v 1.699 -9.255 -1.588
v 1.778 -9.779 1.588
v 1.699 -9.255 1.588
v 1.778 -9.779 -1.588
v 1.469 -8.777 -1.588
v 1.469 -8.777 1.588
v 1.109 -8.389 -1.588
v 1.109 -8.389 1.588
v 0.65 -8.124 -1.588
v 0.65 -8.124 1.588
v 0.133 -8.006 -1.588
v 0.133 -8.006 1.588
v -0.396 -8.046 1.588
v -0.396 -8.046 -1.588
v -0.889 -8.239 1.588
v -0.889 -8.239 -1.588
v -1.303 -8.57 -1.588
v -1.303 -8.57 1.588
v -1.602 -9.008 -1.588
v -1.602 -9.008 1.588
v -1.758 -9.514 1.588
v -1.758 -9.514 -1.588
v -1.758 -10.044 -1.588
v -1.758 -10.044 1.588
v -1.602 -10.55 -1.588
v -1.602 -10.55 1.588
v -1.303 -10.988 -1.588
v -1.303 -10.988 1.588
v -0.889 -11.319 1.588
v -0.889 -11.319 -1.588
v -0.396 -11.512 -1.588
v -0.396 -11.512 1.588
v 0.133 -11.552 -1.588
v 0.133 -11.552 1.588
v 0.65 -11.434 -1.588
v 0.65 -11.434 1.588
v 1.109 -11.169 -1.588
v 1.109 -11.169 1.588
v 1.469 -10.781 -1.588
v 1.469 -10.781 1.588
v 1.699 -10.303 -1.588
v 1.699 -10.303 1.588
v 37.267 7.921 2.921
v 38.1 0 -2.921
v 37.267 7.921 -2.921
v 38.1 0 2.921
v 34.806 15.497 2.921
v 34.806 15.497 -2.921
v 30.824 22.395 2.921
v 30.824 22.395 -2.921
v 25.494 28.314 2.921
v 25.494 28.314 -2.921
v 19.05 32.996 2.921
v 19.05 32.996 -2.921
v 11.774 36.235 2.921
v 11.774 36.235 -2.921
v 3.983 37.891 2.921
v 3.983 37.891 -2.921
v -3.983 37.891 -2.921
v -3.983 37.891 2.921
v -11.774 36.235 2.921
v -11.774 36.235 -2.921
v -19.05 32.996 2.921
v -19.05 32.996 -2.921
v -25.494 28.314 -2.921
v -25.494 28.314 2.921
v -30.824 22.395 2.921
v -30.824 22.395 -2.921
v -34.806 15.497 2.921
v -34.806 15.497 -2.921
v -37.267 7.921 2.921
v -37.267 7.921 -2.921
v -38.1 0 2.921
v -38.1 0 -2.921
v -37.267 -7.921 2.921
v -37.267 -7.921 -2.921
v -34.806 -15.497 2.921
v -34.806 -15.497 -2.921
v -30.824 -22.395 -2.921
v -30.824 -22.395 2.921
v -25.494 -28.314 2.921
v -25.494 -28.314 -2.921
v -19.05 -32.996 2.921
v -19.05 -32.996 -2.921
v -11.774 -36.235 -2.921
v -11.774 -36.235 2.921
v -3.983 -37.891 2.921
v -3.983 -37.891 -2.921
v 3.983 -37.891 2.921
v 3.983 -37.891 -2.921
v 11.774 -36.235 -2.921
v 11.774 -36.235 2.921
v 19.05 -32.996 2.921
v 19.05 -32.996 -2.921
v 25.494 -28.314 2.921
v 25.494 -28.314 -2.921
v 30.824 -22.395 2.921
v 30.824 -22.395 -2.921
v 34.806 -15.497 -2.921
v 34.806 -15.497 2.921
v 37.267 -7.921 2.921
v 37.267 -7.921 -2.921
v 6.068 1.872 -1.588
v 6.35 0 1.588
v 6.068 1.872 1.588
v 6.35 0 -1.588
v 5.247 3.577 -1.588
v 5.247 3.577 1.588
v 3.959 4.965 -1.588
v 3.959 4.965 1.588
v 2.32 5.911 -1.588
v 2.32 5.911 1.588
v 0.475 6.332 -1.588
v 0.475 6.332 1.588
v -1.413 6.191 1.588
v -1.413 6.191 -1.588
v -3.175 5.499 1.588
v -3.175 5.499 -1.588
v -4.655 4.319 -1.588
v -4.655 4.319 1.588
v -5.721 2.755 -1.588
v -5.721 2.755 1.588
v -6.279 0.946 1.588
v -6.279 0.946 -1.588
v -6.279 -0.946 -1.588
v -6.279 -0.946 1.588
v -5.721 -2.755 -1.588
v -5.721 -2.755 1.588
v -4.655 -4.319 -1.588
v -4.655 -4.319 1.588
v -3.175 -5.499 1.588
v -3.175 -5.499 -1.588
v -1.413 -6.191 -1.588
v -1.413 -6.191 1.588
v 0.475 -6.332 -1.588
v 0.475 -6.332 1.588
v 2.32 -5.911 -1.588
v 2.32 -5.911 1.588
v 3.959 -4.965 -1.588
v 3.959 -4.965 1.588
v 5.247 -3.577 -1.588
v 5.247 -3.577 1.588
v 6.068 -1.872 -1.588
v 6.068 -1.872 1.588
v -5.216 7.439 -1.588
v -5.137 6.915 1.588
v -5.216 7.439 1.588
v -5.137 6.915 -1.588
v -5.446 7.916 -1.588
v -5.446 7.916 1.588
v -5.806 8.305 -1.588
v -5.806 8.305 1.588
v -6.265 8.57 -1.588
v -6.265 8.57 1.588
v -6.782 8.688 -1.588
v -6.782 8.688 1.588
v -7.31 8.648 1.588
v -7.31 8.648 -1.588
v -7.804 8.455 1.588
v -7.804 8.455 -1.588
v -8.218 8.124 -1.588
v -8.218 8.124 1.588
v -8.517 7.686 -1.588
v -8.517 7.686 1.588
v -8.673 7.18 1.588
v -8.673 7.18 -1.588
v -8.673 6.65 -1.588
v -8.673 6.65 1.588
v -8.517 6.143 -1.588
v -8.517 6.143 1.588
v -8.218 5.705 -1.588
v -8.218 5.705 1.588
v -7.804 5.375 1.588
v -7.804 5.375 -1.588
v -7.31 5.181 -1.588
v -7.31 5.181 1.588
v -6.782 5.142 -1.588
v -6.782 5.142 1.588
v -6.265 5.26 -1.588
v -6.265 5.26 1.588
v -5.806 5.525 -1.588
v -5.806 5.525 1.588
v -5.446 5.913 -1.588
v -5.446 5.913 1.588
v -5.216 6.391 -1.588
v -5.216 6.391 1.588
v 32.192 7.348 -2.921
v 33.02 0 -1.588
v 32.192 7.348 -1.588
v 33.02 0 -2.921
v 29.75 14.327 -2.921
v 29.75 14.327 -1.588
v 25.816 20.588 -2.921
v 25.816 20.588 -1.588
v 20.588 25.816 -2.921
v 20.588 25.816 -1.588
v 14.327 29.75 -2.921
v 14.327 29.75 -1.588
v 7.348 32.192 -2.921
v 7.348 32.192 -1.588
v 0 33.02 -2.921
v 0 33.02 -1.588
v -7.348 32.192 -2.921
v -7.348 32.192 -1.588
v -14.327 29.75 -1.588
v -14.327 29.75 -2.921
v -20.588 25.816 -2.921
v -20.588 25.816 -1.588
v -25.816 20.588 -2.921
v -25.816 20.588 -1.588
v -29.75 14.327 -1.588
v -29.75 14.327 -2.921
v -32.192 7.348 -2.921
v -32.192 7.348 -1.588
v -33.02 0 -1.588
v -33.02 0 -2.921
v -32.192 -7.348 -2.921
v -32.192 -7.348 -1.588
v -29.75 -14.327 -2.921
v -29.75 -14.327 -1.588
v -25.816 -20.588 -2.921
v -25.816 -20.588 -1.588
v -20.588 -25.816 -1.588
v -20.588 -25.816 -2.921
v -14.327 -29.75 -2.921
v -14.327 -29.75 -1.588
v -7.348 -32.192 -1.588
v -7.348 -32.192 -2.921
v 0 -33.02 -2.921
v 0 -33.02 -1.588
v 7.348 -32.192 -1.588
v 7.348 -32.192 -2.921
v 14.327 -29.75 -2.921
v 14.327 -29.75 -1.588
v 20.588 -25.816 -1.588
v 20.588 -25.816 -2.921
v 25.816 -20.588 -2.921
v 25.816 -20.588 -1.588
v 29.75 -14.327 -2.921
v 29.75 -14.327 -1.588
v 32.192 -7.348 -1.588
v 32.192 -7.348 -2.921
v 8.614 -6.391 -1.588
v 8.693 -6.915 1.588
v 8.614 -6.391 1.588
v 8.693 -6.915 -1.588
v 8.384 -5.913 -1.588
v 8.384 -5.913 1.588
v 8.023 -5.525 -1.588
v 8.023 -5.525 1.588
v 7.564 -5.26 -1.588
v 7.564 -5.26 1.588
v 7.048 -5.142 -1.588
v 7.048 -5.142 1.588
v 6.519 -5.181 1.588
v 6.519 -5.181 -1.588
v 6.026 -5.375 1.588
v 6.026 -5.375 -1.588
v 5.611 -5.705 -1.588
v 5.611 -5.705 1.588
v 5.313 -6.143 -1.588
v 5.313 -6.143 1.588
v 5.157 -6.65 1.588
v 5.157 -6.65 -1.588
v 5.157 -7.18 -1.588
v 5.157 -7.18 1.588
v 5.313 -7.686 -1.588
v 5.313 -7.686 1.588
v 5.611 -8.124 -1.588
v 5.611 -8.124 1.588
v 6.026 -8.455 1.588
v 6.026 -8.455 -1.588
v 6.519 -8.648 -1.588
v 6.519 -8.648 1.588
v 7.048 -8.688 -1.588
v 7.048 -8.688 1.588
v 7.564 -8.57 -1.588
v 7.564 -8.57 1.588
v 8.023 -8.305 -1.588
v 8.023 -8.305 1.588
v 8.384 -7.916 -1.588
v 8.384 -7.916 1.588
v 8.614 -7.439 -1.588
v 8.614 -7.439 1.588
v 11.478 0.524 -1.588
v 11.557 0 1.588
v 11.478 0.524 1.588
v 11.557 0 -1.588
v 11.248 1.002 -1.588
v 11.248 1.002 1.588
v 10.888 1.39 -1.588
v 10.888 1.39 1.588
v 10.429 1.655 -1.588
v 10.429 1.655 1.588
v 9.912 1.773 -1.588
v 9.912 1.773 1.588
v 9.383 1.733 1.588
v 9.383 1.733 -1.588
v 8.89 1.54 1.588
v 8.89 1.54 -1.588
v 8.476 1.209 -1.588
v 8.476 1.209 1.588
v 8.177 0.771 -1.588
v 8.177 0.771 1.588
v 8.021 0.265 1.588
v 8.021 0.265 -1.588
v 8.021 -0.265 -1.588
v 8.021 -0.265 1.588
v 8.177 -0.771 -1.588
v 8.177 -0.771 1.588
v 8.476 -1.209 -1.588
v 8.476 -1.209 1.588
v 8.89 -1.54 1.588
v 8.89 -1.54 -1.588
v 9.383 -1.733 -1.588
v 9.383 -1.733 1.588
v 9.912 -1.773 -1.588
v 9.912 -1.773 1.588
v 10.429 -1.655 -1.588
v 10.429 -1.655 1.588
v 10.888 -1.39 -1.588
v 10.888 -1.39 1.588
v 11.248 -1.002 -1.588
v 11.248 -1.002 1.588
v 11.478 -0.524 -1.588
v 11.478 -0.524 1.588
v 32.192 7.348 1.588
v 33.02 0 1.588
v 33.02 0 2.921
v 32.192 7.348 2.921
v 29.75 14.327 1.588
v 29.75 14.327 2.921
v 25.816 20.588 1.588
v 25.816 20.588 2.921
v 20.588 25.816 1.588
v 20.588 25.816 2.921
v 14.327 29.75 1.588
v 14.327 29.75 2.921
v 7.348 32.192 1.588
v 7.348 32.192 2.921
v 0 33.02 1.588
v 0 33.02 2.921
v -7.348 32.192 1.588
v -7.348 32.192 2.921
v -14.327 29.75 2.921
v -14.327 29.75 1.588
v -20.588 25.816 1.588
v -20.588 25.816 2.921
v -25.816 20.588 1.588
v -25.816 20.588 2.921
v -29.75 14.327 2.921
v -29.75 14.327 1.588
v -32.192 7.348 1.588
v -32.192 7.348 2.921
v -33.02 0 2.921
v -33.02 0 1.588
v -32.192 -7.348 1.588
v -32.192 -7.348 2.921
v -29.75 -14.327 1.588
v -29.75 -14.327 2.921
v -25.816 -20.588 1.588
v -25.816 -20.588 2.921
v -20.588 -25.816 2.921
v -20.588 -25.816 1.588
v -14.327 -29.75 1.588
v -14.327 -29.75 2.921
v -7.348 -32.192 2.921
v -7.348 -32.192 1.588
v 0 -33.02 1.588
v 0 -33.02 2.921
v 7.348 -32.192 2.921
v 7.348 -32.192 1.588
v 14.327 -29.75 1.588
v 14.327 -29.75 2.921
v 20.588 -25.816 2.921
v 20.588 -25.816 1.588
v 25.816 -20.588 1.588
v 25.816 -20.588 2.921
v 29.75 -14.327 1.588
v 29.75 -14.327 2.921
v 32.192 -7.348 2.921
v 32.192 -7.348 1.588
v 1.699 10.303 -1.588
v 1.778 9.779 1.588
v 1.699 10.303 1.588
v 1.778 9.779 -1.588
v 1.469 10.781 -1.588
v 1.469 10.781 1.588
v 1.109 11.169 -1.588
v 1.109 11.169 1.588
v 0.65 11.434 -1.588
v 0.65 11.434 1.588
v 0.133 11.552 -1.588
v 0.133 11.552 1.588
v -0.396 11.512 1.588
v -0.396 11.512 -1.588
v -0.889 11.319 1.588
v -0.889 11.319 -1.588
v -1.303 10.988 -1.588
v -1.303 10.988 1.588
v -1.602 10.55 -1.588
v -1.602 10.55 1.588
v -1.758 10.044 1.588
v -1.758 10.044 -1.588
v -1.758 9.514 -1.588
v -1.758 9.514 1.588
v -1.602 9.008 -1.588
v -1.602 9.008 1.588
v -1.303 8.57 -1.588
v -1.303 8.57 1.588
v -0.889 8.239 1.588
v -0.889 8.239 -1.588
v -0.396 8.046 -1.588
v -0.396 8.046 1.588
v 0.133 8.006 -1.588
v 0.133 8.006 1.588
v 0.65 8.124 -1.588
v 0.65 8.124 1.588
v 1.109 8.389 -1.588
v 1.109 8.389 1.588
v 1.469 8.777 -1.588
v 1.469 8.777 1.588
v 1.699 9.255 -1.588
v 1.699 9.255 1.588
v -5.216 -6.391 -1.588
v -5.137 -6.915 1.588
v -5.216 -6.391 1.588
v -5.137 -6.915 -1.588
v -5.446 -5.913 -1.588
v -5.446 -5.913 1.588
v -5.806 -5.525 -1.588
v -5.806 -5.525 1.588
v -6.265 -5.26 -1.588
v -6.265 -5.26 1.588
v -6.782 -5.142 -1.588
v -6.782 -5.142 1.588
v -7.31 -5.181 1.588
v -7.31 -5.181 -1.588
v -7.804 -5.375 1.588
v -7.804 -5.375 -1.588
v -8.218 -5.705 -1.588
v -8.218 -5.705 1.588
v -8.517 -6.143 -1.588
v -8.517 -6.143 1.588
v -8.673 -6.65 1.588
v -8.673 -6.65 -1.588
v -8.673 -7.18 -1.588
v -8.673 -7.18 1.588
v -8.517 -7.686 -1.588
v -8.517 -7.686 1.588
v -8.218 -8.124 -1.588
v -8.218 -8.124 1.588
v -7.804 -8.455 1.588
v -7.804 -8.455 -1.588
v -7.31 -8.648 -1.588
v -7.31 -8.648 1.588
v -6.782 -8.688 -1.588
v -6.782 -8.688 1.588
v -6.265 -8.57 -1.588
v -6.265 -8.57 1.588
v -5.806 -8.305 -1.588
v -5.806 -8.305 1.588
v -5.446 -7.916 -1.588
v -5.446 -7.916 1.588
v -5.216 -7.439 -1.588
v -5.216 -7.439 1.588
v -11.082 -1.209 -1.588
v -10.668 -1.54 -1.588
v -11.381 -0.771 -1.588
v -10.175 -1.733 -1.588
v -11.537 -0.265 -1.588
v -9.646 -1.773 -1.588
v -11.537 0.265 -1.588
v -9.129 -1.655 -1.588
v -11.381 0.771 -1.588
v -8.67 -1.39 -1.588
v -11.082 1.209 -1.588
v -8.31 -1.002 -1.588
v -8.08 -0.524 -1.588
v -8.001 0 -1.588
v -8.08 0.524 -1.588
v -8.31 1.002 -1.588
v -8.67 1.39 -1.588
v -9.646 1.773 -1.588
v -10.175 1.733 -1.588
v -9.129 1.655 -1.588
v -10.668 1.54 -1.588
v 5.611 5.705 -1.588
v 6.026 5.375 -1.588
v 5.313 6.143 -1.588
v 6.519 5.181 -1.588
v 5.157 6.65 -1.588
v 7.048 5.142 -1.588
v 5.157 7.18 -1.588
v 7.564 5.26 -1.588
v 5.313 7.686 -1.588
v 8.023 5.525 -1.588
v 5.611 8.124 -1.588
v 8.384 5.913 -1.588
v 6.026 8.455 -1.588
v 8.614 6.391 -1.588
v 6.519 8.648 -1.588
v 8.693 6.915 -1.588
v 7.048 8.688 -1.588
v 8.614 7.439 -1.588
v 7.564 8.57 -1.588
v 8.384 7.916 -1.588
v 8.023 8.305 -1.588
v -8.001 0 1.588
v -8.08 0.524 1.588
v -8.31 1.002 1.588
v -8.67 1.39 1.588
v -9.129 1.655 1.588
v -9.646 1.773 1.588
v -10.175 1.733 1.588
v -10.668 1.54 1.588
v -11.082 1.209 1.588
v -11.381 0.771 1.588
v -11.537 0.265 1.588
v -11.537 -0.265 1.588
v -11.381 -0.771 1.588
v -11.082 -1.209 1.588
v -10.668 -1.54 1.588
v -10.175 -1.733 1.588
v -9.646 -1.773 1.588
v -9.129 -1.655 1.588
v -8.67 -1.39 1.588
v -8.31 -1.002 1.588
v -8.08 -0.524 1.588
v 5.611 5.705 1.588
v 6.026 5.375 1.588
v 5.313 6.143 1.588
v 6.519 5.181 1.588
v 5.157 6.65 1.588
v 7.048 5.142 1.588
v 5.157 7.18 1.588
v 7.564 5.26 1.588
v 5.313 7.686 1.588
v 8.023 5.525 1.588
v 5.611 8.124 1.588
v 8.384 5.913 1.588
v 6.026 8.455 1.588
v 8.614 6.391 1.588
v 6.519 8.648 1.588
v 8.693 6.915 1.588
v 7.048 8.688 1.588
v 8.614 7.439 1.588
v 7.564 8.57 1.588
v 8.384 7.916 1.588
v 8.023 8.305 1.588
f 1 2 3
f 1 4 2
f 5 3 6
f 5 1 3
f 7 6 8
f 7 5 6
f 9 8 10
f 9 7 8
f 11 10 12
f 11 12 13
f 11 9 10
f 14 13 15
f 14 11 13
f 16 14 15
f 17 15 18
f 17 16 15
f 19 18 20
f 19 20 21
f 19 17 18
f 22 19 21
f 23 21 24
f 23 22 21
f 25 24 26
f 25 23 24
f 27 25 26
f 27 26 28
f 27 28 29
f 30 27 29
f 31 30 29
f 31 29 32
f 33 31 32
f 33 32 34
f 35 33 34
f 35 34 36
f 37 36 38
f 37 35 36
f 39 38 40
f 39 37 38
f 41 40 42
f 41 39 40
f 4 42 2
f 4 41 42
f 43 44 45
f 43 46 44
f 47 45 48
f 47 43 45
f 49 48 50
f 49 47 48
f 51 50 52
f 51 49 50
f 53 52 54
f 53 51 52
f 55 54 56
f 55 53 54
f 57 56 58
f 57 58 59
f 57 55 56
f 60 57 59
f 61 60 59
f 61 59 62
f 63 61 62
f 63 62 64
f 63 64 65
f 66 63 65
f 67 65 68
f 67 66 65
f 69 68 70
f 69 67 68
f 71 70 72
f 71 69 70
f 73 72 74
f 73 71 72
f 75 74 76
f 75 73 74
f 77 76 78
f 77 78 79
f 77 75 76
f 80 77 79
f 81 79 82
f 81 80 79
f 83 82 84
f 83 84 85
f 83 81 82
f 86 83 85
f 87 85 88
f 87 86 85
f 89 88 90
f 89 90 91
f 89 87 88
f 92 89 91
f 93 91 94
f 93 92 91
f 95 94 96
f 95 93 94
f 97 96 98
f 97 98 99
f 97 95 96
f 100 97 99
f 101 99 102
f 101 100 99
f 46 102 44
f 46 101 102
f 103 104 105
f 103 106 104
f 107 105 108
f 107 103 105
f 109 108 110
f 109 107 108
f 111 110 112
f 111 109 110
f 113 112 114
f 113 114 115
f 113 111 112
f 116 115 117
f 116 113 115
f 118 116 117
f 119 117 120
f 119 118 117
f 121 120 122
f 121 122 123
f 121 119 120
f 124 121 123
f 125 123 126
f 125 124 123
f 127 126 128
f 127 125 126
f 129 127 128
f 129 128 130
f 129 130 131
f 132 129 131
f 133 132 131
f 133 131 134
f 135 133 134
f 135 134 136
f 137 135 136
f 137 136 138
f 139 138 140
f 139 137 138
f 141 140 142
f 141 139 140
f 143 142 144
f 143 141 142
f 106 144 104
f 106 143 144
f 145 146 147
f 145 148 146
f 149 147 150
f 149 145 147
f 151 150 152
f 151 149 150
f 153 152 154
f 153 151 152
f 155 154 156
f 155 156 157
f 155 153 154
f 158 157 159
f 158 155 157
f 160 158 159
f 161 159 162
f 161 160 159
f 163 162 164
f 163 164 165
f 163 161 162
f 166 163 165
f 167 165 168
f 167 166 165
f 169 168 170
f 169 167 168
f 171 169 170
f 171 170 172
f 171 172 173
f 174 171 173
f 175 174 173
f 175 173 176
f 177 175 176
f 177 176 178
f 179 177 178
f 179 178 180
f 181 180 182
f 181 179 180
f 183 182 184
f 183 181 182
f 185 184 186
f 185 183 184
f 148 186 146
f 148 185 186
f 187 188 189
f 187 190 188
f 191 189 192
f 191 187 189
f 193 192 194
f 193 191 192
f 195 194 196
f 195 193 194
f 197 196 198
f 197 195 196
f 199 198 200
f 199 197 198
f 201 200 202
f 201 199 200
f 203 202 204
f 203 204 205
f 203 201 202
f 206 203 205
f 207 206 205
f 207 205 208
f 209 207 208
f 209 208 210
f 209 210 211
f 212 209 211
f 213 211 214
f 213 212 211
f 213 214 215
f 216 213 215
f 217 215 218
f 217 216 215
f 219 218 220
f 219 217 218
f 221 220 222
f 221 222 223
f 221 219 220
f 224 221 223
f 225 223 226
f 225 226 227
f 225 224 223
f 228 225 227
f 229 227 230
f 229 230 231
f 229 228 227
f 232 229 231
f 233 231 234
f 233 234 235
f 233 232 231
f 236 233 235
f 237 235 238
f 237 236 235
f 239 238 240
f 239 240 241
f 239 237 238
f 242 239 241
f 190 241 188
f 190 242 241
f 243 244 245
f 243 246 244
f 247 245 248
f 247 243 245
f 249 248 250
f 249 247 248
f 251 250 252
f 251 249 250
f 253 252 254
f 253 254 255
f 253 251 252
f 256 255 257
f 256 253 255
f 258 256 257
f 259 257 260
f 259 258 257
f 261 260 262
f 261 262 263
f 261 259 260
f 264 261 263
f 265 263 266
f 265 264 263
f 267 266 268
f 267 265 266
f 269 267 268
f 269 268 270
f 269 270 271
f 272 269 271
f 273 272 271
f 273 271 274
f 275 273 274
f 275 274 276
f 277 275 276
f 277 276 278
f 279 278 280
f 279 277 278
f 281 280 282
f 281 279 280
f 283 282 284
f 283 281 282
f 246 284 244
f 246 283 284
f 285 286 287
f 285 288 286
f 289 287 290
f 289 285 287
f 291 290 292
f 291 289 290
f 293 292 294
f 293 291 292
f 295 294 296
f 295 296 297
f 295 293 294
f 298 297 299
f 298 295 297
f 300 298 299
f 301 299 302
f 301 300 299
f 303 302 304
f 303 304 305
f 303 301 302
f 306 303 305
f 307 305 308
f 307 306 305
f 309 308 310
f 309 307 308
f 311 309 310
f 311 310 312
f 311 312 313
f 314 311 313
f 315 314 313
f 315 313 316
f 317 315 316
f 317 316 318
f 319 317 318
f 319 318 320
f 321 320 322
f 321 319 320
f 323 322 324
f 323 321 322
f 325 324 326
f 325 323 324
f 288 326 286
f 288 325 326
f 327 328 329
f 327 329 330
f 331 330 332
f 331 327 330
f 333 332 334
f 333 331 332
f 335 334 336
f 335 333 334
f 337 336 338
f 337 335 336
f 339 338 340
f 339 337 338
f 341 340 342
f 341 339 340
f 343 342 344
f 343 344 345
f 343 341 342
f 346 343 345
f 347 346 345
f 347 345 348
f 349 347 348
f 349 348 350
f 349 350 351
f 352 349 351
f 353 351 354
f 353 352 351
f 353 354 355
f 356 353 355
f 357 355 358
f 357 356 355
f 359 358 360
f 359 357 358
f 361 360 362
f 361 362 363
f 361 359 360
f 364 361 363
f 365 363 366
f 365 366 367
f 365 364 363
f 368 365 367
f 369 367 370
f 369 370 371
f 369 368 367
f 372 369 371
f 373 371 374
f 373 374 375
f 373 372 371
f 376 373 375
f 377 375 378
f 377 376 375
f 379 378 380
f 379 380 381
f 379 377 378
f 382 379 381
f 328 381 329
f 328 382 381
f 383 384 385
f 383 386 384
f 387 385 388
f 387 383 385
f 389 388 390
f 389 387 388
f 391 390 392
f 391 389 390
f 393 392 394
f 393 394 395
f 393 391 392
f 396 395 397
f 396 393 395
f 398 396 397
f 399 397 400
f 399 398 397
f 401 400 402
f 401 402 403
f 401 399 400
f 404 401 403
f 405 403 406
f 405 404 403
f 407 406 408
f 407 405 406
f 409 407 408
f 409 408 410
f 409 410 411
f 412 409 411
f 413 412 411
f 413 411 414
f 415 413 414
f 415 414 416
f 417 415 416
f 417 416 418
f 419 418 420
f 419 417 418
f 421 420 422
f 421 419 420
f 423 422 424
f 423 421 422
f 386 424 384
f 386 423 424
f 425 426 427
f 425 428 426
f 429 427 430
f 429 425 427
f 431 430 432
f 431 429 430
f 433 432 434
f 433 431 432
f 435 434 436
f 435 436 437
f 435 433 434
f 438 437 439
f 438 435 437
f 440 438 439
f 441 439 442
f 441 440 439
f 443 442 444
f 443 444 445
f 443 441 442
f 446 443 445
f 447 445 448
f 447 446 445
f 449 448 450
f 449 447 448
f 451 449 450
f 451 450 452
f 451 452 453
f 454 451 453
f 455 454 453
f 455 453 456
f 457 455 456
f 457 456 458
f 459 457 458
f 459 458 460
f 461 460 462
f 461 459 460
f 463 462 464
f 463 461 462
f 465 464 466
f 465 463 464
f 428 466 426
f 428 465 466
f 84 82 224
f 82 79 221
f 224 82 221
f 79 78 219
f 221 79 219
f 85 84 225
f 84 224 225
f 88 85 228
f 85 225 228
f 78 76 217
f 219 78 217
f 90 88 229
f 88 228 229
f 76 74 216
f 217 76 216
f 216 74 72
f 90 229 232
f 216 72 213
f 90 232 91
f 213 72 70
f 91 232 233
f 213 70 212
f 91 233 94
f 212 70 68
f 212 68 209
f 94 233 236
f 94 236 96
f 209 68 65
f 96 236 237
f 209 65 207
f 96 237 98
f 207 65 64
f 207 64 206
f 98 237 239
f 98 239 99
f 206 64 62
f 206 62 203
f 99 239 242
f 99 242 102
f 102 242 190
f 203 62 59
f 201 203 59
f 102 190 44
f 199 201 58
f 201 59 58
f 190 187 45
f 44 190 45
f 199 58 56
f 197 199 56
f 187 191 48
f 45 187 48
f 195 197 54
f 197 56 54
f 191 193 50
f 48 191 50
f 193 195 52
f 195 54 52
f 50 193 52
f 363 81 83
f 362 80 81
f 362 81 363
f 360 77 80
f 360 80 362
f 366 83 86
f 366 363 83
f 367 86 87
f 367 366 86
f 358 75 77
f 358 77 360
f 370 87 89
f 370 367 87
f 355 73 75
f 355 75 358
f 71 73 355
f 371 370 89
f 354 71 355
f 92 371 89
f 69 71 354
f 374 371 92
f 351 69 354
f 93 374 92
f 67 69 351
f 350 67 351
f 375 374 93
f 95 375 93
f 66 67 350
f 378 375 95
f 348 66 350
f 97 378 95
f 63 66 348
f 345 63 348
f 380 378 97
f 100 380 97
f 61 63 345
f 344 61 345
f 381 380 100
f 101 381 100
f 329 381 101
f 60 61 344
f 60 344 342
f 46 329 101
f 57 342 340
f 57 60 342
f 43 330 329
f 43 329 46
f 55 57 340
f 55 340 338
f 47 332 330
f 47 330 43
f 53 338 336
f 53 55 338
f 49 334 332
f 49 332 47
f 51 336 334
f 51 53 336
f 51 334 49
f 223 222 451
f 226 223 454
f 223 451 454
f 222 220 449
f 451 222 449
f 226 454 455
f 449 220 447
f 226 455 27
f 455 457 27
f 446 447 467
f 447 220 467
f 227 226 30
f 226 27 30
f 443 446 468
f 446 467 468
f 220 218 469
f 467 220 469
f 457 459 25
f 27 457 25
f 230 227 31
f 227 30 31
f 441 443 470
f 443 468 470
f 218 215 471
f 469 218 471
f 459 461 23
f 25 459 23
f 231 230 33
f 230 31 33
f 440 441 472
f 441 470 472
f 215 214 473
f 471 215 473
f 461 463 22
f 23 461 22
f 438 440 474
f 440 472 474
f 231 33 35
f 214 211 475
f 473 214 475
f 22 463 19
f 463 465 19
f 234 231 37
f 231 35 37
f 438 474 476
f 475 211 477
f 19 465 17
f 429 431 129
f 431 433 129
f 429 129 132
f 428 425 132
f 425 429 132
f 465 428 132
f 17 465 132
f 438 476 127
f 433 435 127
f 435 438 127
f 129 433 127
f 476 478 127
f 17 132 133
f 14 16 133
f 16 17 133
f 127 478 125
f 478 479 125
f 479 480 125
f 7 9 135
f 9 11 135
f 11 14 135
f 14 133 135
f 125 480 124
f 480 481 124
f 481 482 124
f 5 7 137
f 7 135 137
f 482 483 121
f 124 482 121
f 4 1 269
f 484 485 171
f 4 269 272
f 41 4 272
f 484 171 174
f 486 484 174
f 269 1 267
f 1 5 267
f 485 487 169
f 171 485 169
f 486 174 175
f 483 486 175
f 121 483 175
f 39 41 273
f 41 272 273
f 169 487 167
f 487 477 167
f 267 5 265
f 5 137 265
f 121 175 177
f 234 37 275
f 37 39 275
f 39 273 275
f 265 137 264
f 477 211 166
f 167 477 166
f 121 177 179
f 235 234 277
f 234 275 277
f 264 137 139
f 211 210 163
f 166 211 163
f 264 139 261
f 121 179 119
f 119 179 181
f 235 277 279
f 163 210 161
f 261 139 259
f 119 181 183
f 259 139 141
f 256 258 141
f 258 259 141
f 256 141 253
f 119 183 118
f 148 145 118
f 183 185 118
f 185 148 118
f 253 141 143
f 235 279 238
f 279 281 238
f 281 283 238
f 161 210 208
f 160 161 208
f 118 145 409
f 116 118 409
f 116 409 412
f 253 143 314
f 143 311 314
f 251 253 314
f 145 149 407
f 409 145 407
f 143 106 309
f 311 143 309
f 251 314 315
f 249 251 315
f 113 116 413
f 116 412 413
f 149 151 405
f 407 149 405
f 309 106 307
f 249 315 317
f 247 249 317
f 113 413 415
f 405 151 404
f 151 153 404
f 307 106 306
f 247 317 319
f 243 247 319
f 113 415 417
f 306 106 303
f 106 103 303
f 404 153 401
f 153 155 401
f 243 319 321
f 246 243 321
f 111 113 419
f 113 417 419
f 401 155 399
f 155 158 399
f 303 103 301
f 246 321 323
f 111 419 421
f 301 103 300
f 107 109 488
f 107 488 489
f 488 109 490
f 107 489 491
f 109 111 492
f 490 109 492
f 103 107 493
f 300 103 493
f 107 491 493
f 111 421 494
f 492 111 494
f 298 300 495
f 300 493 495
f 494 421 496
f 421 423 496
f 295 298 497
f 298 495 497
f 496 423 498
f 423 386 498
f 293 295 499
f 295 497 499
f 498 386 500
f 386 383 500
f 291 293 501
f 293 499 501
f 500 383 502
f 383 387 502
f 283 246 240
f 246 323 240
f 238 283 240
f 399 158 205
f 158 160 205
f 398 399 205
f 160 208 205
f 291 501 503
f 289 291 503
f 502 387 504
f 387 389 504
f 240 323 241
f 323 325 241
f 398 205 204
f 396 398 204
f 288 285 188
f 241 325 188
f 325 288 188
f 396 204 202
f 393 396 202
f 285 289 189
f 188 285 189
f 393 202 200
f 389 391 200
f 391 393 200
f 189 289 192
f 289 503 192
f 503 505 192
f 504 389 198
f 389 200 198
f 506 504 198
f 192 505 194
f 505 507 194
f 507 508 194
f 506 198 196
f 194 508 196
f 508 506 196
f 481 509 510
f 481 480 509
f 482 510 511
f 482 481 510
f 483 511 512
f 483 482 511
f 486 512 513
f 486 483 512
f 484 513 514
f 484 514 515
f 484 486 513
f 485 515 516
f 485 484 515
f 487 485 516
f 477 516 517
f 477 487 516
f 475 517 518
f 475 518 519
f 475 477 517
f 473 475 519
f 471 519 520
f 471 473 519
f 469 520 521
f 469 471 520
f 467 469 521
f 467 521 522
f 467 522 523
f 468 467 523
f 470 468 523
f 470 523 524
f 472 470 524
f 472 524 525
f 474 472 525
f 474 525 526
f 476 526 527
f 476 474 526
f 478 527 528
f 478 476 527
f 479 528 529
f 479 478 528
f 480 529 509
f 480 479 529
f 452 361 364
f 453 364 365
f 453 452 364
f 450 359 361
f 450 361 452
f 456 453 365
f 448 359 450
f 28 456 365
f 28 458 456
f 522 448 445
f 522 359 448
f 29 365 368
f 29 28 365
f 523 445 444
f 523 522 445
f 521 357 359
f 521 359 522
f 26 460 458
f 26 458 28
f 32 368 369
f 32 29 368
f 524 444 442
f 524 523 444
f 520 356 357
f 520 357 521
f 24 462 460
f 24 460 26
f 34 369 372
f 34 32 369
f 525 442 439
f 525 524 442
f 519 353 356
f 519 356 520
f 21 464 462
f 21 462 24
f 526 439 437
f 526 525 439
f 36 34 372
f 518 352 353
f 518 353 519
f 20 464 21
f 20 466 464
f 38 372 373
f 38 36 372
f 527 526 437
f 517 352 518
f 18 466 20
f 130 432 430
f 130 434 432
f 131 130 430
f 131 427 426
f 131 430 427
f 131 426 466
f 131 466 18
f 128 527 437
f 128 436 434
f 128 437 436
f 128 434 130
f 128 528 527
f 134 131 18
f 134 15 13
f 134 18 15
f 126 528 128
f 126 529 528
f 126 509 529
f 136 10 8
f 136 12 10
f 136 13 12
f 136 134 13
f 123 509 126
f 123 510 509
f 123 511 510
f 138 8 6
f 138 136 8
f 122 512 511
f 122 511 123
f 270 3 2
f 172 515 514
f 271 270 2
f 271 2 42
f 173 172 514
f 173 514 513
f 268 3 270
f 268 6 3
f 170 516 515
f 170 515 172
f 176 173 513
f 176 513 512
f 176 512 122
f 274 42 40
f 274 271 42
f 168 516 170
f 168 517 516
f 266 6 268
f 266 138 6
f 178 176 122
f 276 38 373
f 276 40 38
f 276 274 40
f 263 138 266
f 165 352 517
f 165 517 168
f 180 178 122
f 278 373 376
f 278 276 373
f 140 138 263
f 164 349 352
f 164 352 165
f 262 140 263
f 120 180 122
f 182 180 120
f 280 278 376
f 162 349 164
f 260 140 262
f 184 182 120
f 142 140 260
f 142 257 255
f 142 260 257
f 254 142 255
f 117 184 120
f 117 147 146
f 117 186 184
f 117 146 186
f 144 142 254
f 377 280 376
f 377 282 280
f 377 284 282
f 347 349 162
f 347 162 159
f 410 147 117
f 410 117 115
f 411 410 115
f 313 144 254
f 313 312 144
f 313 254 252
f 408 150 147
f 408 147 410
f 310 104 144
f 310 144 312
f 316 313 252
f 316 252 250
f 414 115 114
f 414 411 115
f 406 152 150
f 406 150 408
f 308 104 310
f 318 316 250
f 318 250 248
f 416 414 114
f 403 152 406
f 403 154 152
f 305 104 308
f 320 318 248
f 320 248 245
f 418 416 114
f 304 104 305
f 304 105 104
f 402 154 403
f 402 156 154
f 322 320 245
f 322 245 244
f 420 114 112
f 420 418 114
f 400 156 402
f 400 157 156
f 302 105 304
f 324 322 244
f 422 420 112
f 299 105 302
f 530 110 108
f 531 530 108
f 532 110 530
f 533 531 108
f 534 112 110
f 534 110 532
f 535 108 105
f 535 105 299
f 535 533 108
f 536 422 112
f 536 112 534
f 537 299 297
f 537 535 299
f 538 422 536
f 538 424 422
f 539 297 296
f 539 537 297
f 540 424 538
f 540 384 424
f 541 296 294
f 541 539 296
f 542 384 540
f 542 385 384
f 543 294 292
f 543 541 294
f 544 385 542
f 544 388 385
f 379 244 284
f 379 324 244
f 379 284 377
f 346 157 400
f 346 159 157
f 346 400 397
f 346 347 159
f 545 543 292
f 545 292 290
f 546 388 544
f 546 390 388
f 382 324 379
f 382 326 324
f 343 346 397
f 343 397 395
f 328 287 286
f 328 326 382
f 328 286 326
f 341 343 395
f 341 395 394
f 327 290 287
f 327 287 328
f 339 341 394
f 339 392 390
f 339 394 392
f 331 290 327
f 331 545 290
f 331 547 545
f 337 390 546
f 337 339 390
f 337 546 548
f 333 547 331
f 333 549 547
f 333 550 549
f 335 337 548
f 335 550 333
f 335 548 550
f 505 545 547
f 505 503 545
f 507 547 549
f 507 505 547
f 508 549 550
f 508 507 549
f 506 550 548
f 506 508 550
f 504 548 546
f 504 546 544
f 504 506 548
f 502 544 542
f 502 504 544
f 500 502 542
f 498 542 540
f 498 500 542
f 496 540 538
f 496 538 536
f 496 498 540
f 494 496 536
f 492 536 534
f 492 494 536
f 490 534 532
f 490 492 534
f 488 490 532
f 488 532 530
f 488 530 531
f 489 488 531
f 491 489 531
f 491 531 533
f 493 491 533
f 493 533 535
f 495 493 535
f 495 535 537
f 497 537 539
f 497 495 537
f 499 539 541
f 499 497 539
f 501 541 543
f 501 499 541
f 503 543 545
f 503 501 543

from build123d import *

# Parameters (mm, degrees)
SKETCH1_R           = 38.1
SKETCH1_R_2         = 33.02
BOSS_EXTRUDE1_DEPTH = 2.921
SKETCH3_R           = 33.02
SKETCH3_R_2         = 6.35
SKETCH3_R_3         = 1.778
BOSS_EXTRUDE2_DEPTH = 1.5875


with BuildPart() as part:
    # Sketch1 → Boss-Extrude1 (new body, symmetric)
    with BuildSketch(Plane.XY):
        Circle(SKETCH1_R)
        Circle(SKETCH1_R_2, mode=Mode.SUBTRACT)
    extrude(amount=BOSS_EXTRUDE1_DEPTH, both=True)

    # Sketch3 → Boss-Extrude2 (add, symmetric)
    with BuildSketch(Plane.XY):
        Circle(SKETCH3_R)
        Circle(SKETCH3_R_2, mode=Mode.SUBTRACT)
        with Locations((0, 9.779)):
            Circle(SKETCH3_R_3, mode=Mode.SUBTRACT)
        with Locations((6.914797213, 6.914797213)):
            Circle(SKETCH3_R_3, mode=Mode.SUBTRACT)
        with Locations((9.779, 0)):
            Circle(SKETCH3_R_3, mode=Mode.SUBTRACT)
        with Locations((6.914797213, -6.914797213)):
            Circle(SKETCH3_R_3, mode=Mode.SUBTRACT)
        with Locations((0, -9.779)):
            Circle(SKETCH3_R_3, mode=Mode.SUBTRACT)
        with Locations((-6.914797213, -6.914797213)):
            Circle(SKETCH3_R_3, mode=Mode.SUBTRACT)
        with Locations((-9.779, 0)):
            Circle(SKETCH3_R_3, mode=Mode.SUBTRACT)
        with Locations((-6.914797213, 6.914797213)):
            Circle(SKETCH3_R_3, mode=Mode.SUBTRACT)
    extrude(amount=BOSS_EXTRUDE2_DEPTH, both=True)


solid = part.part
